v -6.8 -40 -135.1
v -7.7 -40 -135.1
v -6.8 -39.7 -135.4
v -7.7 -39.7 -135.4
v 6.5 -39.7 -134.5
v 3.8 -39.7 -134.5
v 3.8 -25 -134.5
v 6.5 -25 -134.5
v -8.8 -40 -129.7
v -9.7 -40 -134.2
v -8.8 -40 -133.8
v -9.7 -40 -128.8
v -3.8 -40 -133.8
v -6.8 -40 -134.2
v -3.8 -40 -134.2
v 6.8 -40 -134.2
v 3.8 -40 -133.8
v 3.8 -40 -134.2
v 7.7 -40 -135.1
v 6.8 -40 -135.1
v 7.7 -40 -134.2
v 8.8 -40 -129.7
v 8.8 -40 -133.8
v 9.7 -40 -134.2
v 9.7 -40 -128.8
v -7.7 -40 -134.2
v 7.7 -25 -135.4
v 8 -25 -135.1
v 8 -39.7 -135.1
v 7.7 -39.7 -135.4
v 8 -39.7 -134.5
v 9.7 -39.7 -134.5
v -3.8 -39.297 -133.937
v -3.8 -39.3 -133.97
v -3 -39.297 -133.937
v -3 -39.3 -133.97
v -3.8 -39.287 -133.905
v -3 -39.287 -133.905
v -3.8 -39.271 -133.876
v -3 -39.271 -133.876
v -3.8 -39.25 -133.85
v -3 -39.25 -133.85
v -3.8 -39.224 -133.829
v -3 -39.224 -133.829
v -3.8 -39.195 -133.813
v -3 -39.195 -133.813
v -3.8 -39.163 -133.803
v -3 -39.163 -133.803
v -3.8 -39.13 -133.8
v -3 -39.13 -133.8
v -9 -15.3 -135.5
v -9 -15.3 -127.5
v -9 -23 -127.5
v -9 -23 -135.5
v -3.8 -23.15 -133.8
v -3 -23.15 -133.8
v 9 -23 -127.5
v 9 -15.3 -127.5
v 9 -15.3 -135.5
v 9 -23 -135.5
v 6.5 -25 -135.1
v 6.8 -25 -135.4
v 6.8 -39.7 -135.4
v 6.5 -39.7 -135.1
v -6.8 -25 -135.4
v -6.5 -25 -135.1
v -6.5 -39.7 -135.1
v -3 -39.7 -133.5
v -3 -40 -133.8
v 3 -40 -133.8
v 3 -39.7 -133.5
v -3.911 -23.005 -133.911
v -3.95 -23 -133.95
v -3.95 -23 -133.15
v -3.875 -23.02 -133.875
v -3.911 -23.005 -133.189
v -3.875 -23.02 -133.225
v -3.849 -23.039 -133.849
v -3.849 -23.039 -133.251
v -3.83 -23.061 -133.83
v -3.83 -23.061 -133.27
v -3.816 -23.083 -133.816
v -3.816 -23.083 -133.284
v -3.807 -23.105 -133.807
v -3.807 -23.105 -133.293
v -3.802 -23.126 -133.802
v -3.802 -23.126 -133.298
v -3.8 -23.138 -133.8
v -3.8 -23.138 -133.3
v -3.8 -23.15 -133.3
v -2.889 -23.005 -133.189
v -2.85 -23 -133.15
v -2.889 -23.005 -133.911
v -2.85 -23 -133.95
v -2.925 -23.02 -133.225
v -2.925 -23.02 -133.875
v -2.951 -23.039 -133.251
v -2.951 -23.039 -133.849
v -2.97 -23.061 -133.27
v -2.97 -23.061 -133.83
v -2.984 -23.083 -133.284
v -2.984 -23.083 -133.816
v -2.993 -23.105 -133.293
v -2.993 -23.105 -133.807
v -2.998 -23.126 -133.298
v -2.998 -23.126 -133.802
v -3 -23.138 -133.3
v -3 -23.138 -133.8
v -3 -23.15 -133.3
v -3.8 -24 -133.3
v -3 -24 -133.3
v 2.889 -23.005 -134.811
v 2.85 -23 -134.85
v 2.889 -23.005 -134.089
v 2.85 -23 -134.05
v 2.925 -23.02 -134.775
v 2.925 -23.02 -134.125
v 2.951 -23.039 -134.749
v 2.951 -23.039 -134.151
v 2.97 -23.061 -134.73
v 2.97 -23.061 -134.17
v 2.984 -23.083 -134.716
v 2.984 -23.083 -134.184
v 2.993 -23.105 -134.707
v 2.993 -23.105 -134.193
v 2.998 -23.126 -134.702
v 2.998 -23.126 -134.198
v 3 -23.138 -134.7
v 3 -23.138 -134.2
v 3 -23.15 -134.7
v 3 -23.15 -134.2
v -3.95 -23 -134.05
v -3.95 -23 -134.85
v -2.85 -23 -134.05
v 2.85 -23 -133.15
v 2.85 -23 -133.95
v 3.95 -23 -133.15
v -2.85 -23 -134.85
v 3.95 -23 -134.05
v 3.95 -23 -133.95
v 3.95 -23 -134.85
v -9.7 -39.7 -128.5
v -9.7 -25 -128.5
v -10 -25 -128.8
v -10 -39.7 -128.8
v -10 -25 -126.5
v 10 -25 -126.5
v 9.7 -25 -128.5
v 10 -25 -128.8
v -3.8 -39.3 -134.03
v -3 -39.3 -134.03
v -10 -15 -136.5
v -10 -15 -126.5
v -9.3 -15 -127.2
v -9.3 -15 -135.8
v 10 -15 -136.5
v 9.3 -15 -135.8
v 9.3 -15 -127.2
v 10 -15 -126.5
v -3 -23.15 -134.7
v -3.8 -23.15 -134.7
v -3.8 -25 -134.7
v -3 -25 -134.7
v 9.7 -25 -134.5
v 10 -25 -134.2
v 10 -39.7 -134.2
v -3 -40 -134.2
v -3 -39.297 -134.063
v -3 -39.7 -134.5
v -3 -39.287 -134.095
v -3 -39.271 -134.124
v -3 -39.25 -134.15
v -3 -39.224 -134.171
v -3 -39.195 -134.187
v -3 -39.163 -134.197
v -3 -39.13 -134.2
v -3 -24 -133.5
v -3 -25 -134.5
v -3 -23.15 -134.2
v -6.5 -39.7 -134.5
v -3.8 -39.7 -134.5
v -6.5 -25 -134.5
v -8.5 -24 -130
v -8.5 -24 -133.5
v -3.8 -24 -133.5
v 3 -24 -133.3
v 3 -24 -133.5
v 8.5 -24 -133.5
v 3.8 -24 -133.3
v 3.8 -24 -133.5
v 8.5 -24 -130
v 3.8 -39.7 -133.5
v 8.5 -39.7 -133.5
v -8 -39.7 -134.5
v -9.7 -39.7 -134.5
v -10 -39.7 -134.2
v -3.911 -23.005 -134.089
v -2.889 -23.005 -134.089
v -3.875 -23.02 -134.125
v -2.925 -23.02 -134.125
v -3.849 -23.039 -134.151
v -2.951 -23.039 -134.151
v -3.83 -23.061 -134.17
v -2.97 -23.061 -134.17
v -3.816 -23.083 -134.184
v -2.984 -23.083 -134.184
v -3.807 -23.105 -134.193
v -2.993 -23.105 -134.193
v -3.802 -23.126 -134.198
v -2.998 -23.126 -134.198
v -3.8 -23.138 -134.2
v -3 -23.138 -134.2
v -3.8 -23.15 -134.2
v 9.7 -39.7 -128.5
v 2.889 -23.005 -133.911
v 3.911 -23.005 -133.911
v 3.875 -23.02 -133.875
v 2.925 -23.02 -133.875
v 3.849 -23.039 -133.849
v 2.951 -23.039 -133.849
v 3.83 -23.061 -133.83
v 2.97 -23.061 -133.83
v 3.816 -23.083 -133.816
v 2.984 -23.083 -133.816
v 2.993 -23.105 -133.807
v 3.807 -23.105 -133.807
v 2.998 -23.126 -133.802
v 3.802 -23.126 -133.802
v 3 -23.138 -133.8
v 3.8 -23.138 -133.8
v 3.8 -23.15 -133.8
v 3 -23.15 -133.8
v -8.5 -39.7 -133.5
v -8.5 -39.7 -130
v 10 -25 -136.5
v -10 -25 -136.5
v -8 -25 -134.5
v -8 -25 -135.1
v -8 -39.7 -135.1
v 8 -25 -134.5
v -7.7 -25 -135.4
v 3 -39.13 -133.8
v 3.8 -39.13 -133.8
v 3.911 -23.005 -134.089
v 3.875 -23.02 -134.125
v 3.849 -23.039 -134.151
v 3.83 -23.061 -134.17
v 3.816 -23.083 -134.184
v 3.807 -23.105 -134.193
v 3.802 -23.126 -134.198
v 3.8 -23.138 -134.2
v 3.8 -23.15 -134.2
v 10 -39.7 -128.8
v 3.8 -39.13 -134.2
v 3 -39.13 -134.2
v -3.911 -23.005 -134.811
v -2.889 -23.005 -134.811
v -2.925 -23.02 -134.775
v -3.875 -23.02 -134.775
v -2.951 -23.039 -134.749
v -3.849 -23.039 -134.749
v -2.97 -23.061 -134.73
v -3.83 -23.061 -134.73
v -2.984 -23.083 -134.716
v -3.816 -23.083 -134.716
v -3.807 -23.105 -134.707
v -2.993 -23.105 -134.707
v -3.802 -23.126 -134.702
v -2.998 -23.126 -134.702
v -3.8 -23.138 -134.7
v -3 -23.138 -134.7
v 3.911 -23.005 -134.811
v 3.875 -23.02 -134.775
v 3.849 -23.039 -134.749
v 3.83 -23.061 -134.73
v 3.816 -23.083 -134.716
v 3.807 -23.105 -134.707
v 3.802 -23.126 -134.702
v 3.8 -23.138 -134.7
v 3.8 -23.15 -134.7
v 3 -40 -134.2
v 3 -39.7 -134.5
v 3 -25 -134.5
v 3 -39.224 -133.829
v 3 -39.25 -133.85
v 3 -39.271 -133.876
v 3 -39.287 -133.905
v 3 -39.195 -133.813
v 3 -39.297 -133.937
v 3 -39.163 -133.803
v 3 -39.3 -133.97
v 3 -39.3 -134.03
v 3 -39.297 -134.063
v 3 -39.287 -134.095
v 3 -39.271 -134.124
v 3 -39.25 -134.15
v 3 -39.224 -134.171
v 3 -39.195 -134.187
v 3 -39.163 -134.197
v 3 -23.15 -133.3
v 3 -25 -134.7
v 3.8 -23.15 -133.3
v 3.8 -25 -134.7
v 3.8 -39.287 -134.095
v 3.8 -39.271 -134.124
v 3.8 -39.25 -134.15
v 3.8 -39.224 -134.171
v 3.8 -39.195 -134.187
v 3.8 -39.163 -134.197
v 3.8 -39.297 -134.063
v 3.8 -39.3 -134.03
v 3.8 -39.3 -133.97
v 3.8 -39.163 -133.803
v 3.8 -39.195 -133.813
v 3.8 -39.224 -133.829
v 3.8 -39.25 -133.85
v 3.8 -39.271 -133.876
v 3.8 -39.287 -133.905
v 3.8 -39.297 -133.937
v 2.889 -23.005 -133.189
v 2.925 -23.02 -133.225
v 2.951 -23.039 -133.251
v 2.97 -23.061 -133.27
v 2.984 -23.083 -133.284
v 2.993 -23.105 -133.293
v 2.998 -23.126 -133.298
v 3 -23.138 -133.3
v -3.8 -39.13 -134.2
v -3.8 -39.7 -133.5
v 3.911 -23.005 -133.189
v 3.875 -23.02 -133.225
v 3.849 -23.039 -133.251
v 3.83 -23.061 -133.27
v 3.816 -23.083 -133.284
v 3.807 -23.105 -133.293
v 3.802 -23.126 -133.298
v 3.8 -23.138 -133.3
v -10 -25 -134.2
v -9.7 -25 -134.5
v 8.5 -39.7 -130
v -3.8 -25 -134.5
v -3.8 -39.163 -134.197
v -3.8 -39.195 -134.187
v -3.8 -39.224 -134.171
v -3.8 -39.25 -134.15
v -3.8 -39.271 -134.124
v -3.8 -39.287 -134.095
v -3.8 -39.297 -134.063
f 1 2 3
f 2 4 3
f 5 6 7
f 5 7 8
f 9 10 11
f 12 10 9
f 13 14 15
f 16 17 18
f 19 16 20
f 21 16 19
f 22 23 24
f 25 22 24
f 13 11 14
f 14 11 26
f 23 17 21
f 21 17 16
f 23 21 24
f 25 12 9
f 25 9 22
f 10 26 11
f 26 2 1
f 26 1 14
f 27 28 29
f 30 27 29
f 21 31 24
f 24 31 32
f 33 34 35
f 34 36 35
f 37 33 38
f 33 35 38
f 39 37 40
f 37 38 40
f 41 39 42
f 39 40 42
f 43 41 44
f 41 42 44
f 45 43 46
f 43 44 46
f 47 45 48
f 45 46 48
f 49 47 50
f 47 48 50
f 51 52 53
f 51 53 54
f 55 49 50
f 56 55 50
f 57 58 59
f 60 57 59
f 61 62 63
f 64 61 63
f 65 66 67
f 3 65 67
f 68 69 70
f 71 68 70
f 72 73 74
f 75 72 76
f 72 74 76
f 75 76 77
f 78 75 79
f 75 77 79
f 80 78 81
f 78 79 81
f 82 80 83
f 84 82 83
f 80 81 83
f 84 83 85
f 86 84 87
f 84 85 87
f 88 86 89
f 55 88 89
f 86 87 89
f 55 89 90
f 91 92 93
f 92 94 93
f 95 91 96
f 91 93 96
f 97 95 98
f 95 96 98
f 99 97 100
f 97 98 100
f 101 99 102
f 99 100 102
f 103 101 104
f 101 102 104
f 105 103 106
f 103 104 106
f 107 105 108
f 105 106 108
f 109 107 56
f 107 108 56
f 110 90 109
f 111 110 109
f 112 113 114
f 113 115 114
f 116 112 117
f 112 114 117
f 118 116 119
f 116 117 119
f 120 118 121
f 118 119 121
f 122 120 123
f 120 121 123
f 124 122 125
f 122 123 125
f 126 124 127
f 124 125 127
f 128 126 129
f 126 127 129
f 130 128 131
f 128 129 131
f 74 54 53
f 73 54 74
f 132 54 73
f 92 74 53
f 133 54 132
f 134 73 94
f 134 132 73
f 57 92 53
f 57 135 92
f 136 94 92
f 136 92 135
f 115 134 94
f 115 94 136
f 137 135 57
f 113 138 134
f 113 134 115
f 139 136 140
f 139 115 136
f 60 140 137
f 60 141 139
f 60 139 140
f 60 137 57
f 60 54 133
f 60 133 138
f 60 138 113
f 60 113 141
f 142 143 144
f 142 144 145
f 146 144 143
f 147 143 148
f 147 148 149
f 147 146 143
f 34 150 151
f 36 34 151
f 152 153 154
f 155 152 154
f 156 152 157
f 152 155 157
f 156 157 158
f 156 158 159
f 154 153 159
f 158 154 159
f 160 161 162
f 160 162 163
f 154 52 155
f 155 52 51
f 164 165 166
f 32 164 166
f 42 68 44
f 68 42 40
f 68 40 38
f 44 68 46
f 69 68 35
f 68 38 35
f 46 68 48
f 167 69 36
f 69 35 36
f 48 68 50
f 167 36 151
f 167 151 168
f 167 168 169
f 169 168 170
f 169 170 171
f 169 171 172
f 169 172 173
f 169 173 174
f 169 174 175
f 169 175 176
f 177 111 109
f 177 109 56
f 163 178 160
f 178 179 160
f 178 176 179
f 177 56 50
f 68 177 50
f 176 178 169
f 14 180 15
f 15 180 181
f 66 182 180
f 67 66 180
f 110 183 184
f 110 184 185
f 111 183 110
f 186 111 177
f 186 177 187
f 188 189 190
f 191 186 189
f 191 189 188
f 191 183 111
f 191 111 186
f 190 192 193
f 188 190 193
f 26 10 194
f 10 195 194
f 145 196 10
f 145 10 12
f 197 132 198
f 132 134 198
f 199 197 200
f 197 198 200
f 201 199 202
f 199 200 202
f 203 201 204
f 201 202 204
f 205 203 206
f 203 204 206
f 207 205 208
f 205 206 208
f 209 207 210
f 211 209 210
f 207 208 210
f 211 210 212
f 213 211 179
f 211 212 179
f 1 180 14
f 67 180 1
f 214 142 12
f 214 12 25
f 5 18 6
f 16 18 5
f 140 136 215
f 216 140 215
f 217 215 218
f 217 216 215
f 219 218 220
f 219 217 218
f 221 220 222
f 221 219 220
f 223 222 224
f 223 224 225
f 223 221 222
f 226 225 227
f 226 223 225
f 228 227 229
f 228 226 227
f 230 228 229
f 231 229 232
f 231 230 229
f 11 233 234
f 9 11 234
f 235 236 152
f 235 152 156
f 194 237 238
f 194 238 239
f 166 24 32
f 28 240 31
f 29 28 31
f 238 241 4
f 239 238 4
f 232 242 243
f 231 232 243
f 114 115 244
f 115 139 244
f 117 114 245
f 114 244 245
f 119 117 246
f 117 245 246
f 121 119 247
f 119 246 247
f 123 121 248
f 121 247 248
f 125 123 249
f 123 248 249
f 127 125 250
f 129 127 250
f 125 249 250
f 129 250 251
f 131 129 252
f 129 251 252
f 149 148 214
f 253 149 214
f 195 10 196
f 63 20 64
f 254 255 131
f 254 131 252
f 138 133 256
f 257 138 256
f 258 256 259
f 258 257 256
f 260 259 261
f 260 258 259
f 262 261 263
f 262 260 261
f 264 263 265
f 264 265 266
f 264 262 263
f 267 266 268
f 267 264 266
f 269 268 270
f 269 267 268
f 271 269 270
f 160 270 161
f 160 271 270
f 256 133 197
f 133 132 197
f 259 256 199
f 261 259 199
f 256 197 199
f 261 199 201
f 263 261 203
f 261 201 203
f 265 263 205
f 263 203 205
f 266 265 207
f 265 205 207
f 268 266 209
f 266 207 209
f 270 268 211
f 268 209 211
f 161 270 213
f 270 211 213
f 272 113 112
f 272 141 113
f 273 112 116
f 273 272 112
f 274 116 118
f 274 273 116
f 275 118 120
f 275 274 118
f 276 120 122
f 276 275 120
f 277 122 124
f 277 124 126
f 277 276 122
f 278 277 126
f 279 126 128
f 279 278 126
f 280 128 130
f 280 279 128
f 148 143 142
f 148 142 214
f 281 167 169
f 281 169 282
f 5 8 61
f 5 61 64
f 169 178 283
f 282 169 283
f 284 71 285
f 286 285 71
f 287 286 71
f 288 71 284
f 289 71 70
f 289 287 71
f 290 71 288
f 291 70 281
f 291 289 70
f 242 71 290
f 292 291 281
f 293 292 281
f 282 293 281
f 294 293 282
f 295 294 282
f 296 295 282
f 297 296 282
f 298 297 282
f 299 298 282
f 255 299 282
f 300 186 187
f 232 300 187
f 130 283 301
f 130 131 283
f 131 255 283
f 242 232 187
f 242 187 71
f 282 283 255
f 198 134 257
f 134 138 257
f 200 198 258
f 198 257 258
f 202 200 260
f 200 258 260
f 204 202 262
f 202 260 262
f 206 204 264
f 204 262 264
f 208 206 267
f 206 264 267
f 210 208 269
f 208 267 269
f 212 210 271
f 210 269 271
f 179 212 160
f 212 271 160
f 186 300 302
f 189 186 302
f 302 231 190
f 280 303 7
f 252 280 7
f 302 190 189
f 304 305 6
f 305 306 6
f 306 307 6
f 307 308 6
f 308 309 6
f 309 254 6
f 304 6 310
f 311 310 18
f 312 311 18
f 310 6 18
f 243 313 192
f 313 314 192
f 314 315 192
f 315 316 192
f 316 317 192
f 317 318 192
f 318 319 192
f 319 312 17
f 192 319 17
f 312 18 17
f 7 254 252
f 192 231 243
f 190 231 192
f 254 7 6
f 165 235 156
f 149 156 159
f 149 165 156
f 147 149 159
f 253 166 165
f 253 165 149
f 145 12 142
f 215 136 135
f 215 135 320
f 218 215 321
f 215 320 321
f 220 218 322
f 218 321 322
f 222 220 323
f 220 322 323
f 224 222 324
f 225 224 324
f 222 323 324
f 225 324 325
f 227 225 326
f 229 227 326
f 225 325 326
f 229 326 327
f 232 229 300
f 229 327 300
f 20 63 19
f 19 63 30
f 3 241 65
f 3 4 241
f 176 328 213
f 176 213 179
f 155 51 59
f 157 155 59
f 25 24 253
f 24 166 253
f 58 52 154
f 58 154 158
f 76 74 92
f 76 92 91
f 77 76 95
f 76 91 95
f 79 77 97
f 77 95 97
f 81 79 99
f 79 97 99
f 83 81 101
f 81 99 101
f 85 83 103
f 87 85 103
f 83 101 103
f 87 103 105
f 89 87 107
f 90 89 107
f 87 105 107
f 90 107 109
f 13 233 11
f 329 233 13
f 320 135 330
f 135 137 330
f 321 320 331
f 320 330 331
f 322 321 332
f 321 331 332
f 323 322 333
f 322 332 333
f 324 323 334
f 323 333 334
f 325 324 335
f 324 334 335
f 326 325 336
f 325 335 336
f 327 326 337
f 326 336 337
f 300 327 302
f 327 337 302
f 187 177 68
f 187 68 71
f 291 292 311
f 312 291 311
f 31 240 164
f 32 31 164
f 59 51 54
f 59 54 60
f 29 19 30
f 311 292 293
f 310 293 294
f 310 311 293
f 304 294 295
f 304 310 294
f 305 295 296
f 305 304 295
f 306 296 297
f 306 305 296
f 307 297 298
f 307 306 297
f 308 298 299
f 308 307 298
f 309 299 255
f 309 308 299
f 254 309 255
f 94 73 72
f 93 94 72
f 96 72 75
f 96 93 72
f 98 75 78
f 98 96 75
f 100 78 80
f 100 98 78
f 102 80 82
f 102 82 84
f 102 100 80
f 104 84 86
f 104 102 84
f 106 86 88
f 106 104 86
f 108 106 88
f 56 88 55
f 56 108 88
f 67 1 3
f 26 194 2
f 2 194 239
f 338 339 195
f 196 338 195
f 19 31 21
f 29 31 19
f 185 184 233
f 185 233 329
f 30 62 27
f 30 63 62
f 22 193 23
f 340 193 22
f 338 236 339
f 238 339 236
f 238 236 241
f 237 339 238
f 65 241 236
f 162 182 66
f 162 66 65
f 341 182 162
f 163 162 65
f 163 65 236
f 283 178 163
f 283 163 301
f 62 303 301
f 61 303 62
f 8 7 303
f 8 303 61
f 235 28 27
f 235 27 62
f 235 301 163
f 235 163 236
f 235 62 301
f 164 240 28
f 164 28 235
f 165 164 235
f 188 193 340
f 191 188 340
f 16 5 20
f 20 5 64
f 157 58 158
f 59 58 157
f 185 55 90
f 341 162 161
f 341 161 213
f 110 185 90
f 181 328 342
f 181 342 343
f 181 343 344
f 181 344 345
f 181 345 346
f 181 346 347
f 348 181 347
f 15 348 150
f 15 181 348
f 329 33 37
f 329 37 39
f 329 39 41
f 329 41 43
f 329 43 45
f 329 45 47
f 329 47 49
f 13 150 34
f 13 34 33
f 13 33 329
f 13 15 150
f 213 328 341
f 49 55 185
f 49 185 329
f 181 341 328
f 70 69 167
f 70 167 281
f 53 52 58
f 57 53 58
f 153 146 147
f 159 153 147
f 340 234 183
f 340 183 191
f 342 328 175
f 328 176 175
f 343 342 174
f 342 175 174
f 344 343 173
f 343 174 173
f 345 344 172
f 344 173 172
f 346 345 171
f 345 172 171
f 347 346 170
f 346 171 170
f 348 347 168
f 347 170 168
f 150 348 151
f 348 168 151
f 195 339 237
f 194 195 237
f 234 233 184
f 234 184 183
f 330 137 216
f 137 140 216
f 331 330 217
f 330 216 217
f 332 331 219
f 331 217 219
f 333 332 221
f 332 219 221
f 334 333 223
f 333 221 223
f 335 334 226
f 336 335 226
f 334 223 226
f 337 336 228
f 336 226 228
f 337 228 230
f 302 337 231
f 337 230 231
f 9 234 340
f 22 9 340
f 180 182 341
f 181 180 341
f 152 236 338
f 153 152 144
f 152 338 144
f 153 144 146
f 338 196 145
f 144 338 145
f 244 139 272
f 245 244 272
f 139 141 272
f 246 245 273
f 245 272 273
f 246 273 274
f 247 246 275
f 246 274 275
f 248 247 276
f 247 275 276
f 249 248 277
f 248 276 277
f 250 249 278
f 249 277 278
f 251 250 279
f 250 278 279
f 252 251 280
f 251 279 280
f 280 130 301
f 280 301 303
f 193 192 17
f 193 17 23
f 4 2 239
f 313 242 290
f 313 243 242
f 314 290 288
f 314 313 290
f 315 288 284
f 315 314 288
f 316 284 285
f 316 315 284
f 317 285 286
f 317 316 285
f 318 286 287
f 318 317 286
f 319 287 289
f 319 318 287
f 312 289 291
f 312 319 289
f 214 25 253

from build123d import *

# Parameters (mm, degrees)
SKETCH090_W     = 20
SKETCH090_H     = 10
PAD049_DEPTH    = 10
SKETCH091_W     = 20
SKETCH091_H     = 6
PAD050_DEPTH    = 15
SKETCH092_W     = 1.5
SKETCH092_H     = 15
PAD051_DEPTH    = 0.9
SKETCH093_W     = 17
SKETCH093_H     = 3.5
POCKET033_DEPTH = 16
SKETCH094_W     = 0.8
SKETCH094_H     = 0.3
POCKET034_DEPTH = 20
SKETCH095_W     = 0.8
SKETCH095_H     = 0.3
POCKET035_DEPTH = 20
SKETCH006_W     = 18
SKETCH006_H     = 8
POCKET003_DEPTH = 8
SKETCH096_W     = 0.8
SKETCH096_H     = 0.7
POCKET036_DEPTH = 2
SKETCH097_W     = 0.8
SKETCH097_H     = 0.5
POCKET037_DEPTH = 5
FILLET_R        = 0.17
CHAMFER054_SIZE = 0.3
CHAMFER007_SIZE = 0.3
FILLET001_R     = 0.15


with BuildPart() as part:
    # Sketch090 → Pad049 (new body)
    with BuildSketch(Plane.XZ):
        Rectangle(SKETCH090_W, SKETCH090_H)
    extrude(amount=-PAD049_DEPTH)

    # Sketch091 (on Face5 of Pad049) → Pad050 (join)
    with BuildSketch(Plane.XZ):
        Rectangle(SKETCH091_W, SKETCH091_H)
    extrude(amount=PAD050_DEPTH)

    # Sketch092 (on Face7 of Pad050) → Pad051 (join)
    with BuildSketch(Plane(origin=(0, 0, -3), x_dir=(1, 0, 0), z_dir=(0, 0, -1))):
        with Locations((-7.25, 7.5)):
            Rectangle(SKETCH092_W, SKETCH092_H)
        with Locations((7.25, 7.5)):
            Rectangle(SKETCH092_W, SKETCH092_H)
    extrude(amount=PAD051_DEPTH)

    # Sketch093 (on Face18 of Pad051) → Pocket033 (cut)
    with BuildSketch(Plane.XZ.offset(15)):
        with Locations((0, -0.25)):
            Rectangle(SKETCH093_W, SKETCH093_H)
    extrude(amount=-POCKET033_DEPTH, mode=Mode.SUBTRACT)

    # Sketch094 (on Face9 of Pocket033) → Pocket034 (cut)
    with BuildSketch(Plane.XZ.offset(15)):
        with Locations((-3.4, -2.15)):
            Rectangle(SKETCH094_W, SKETCH094_H)
        with Locations((3.4, -2.15)):
            Rectangle(SKETCH094_W, SKETCH094_H)
    extrude(amount=-POCKET034_DEPTH, mode=Mode.SUBTRACT)

    # Sketch095 (on Face9 of Pocket034) → Pocket035 (cut)
    with BuildSketch(Plane.XZ.offset(15)):
        with Locations((-3.4, -2.85)):
            Rectangle(SKETCH095_W, SKETCH095_H)
        with Locations((3.4, -2.85)):
            Rectangle(SKETCH095_W, SKETCH095_H)
    extrude(amount=-POCKET035_DEPTH, mode=Mode.SUBTRACT)

    # Sketch006 (on Face5 of Pocket035) → Pocket003 (cut)
    with BuildSketch(Plane(origin=(0, 10, 0), x_dir=(1, 0, 0), z_dir=(0, 1, 0))):
        Rectangle(SKETCH006_W, SKETCH006_H)
    extrude(amount=-POCKET003_DEPTH, mode=Mode.SUBTRACT)

    # Sketch096 (on Face21 of Pocket003) → Pocket036 (cut)
    with BuildSketch(Plane(origin=(0, 0, -3), x_dir=(1, 0, 0), z_dir=(0, 0, -1))):
        with Locations((-3.4, 14.65)):
            Rectangle(SKETCH096_W, SKETCH096_H)
        with Locations((3.4, 14.65)):
            Rectangle(SKETCH096_W, SKETCH096_H)
    extrude(amount=-POCKET036_DEPTH, mode=Mode.SUBTRACT)

    # Sketch097 (on Face36 of Pocket036) → Pocket037 (cut)
    with BuildSketch(Plane(origin=(0, 2, 0), x_dir=(1, 0, 0), z_dir=(0, 1, 0))):
        with Locations((-3.4, 2.95)):
            Rectangle(SKETCH097_W, SKETCH097_H)
        with Locations((-3.4, 2.05)):
            Rectangle(SKETCH097_W, SKETCH097_H)
        with Locations((3.4, 2.95)):
            Rectangle(SKETCH097_W, SKETCH097_H)
        with Locations((3.4, 2.05)):
            Rectangle(SKETCH097_W, SKETCH097_H)
    extrude(amount=-POCKET037_DEPTH, mode=Mode.SUBTRACT)

    # Fillet
    fillet_edges = [part.edges().sort_by_distance(p)[0] for p in [
        (-3.4, -14.3, -2.3),
        (-3.4, -14.3, -2.7),
        (3.4, -14.3, -2.3),
        (3.4, -14.3, -2.7),
    ]]
    fillet(fillet_edges, radius=FILLET_R)

    # Chamfer054
    chamfer054_edges = [part.edges().sort_by_distance(p)[0] for p in [
        (-9, -15, -3),
        (-10, -15, 0),
        (0, -15, 3),
        (10, -15, 0),
        (9, -15, -3),
        (8, -15, -3.45),
        (7.25, -15, -3.9),
        (6.5, -15, -3.45),
        (5.15, -15, -3),
        (0, -15, -3),
        (-5.15, -15, -3),
        (-7.25, -15, -3.9),
        (-8, -15, -3.45),
        (-6.5, -15, -3.45),
        (-6.15, -15, -2),
        (0, -15, -2),
        (6.15, -15, -2),
        (8.5, -15, -0.25),
        (0, -15, 1.5),
        (-8.5, -15, -0.25),
        (10, -7.5, 3),
        (10, -7.5, -3),
        (-10, -7.5, -3),
        (-10, -7.5, 3),
        (8, -7.5, -3.9),
        (6.5, -7.5, -3.9),
        (-6.5, -7.5, -3.9),
        (-8, -7.5, -3.9),
    ]]
    chamfer(chamfer054_edges, length=CHAMFER054_SIZE)

    # Chamfer007
    chamfer007_edges = [part.edges().sort_by_distance(p)[0] for p in [
        (0, 10, -4),
        (-9, 10, 0),
        (0, 10, 4),
        (9, 10, 0),
    ]]
    chamfer(chamfer007_edges, length=CHAMFER007_SIZE)

    # Fillet001
    fillet001_edges = [part.edges().sort_by_distance(p)[0] for p in [
        (3.4, 2, -2.3),
        (3.8, 2, -2.05),
        (3.4, 2, -1.8),
        (3, 2, -2.05),
        (3.4, 2, -2.7),
        (3.8, 2, -2.95),
        (3.4, 2, -3.2),
        (3, 2, -2.95),
        (-3.4, 2, -1.8),
        (-3.8, 2, -2.05),
        (-3.4, 2, -2.3),
        (-3, 2, -2.05),
        (-3.4, 2, -2.7),
        (-3.8, 2, -2.95),
        (-3.4, 2, -3.2),
        (-3, 2, -2.95),
    ]]
    fillet(fillet001_edges, radius=FILLET001_R)


with BuildPart() as part_1:
    # Body017 placement: moved
    add(part.part.moved(Location((0, -25, -131.5))))


solid = part_1.part
